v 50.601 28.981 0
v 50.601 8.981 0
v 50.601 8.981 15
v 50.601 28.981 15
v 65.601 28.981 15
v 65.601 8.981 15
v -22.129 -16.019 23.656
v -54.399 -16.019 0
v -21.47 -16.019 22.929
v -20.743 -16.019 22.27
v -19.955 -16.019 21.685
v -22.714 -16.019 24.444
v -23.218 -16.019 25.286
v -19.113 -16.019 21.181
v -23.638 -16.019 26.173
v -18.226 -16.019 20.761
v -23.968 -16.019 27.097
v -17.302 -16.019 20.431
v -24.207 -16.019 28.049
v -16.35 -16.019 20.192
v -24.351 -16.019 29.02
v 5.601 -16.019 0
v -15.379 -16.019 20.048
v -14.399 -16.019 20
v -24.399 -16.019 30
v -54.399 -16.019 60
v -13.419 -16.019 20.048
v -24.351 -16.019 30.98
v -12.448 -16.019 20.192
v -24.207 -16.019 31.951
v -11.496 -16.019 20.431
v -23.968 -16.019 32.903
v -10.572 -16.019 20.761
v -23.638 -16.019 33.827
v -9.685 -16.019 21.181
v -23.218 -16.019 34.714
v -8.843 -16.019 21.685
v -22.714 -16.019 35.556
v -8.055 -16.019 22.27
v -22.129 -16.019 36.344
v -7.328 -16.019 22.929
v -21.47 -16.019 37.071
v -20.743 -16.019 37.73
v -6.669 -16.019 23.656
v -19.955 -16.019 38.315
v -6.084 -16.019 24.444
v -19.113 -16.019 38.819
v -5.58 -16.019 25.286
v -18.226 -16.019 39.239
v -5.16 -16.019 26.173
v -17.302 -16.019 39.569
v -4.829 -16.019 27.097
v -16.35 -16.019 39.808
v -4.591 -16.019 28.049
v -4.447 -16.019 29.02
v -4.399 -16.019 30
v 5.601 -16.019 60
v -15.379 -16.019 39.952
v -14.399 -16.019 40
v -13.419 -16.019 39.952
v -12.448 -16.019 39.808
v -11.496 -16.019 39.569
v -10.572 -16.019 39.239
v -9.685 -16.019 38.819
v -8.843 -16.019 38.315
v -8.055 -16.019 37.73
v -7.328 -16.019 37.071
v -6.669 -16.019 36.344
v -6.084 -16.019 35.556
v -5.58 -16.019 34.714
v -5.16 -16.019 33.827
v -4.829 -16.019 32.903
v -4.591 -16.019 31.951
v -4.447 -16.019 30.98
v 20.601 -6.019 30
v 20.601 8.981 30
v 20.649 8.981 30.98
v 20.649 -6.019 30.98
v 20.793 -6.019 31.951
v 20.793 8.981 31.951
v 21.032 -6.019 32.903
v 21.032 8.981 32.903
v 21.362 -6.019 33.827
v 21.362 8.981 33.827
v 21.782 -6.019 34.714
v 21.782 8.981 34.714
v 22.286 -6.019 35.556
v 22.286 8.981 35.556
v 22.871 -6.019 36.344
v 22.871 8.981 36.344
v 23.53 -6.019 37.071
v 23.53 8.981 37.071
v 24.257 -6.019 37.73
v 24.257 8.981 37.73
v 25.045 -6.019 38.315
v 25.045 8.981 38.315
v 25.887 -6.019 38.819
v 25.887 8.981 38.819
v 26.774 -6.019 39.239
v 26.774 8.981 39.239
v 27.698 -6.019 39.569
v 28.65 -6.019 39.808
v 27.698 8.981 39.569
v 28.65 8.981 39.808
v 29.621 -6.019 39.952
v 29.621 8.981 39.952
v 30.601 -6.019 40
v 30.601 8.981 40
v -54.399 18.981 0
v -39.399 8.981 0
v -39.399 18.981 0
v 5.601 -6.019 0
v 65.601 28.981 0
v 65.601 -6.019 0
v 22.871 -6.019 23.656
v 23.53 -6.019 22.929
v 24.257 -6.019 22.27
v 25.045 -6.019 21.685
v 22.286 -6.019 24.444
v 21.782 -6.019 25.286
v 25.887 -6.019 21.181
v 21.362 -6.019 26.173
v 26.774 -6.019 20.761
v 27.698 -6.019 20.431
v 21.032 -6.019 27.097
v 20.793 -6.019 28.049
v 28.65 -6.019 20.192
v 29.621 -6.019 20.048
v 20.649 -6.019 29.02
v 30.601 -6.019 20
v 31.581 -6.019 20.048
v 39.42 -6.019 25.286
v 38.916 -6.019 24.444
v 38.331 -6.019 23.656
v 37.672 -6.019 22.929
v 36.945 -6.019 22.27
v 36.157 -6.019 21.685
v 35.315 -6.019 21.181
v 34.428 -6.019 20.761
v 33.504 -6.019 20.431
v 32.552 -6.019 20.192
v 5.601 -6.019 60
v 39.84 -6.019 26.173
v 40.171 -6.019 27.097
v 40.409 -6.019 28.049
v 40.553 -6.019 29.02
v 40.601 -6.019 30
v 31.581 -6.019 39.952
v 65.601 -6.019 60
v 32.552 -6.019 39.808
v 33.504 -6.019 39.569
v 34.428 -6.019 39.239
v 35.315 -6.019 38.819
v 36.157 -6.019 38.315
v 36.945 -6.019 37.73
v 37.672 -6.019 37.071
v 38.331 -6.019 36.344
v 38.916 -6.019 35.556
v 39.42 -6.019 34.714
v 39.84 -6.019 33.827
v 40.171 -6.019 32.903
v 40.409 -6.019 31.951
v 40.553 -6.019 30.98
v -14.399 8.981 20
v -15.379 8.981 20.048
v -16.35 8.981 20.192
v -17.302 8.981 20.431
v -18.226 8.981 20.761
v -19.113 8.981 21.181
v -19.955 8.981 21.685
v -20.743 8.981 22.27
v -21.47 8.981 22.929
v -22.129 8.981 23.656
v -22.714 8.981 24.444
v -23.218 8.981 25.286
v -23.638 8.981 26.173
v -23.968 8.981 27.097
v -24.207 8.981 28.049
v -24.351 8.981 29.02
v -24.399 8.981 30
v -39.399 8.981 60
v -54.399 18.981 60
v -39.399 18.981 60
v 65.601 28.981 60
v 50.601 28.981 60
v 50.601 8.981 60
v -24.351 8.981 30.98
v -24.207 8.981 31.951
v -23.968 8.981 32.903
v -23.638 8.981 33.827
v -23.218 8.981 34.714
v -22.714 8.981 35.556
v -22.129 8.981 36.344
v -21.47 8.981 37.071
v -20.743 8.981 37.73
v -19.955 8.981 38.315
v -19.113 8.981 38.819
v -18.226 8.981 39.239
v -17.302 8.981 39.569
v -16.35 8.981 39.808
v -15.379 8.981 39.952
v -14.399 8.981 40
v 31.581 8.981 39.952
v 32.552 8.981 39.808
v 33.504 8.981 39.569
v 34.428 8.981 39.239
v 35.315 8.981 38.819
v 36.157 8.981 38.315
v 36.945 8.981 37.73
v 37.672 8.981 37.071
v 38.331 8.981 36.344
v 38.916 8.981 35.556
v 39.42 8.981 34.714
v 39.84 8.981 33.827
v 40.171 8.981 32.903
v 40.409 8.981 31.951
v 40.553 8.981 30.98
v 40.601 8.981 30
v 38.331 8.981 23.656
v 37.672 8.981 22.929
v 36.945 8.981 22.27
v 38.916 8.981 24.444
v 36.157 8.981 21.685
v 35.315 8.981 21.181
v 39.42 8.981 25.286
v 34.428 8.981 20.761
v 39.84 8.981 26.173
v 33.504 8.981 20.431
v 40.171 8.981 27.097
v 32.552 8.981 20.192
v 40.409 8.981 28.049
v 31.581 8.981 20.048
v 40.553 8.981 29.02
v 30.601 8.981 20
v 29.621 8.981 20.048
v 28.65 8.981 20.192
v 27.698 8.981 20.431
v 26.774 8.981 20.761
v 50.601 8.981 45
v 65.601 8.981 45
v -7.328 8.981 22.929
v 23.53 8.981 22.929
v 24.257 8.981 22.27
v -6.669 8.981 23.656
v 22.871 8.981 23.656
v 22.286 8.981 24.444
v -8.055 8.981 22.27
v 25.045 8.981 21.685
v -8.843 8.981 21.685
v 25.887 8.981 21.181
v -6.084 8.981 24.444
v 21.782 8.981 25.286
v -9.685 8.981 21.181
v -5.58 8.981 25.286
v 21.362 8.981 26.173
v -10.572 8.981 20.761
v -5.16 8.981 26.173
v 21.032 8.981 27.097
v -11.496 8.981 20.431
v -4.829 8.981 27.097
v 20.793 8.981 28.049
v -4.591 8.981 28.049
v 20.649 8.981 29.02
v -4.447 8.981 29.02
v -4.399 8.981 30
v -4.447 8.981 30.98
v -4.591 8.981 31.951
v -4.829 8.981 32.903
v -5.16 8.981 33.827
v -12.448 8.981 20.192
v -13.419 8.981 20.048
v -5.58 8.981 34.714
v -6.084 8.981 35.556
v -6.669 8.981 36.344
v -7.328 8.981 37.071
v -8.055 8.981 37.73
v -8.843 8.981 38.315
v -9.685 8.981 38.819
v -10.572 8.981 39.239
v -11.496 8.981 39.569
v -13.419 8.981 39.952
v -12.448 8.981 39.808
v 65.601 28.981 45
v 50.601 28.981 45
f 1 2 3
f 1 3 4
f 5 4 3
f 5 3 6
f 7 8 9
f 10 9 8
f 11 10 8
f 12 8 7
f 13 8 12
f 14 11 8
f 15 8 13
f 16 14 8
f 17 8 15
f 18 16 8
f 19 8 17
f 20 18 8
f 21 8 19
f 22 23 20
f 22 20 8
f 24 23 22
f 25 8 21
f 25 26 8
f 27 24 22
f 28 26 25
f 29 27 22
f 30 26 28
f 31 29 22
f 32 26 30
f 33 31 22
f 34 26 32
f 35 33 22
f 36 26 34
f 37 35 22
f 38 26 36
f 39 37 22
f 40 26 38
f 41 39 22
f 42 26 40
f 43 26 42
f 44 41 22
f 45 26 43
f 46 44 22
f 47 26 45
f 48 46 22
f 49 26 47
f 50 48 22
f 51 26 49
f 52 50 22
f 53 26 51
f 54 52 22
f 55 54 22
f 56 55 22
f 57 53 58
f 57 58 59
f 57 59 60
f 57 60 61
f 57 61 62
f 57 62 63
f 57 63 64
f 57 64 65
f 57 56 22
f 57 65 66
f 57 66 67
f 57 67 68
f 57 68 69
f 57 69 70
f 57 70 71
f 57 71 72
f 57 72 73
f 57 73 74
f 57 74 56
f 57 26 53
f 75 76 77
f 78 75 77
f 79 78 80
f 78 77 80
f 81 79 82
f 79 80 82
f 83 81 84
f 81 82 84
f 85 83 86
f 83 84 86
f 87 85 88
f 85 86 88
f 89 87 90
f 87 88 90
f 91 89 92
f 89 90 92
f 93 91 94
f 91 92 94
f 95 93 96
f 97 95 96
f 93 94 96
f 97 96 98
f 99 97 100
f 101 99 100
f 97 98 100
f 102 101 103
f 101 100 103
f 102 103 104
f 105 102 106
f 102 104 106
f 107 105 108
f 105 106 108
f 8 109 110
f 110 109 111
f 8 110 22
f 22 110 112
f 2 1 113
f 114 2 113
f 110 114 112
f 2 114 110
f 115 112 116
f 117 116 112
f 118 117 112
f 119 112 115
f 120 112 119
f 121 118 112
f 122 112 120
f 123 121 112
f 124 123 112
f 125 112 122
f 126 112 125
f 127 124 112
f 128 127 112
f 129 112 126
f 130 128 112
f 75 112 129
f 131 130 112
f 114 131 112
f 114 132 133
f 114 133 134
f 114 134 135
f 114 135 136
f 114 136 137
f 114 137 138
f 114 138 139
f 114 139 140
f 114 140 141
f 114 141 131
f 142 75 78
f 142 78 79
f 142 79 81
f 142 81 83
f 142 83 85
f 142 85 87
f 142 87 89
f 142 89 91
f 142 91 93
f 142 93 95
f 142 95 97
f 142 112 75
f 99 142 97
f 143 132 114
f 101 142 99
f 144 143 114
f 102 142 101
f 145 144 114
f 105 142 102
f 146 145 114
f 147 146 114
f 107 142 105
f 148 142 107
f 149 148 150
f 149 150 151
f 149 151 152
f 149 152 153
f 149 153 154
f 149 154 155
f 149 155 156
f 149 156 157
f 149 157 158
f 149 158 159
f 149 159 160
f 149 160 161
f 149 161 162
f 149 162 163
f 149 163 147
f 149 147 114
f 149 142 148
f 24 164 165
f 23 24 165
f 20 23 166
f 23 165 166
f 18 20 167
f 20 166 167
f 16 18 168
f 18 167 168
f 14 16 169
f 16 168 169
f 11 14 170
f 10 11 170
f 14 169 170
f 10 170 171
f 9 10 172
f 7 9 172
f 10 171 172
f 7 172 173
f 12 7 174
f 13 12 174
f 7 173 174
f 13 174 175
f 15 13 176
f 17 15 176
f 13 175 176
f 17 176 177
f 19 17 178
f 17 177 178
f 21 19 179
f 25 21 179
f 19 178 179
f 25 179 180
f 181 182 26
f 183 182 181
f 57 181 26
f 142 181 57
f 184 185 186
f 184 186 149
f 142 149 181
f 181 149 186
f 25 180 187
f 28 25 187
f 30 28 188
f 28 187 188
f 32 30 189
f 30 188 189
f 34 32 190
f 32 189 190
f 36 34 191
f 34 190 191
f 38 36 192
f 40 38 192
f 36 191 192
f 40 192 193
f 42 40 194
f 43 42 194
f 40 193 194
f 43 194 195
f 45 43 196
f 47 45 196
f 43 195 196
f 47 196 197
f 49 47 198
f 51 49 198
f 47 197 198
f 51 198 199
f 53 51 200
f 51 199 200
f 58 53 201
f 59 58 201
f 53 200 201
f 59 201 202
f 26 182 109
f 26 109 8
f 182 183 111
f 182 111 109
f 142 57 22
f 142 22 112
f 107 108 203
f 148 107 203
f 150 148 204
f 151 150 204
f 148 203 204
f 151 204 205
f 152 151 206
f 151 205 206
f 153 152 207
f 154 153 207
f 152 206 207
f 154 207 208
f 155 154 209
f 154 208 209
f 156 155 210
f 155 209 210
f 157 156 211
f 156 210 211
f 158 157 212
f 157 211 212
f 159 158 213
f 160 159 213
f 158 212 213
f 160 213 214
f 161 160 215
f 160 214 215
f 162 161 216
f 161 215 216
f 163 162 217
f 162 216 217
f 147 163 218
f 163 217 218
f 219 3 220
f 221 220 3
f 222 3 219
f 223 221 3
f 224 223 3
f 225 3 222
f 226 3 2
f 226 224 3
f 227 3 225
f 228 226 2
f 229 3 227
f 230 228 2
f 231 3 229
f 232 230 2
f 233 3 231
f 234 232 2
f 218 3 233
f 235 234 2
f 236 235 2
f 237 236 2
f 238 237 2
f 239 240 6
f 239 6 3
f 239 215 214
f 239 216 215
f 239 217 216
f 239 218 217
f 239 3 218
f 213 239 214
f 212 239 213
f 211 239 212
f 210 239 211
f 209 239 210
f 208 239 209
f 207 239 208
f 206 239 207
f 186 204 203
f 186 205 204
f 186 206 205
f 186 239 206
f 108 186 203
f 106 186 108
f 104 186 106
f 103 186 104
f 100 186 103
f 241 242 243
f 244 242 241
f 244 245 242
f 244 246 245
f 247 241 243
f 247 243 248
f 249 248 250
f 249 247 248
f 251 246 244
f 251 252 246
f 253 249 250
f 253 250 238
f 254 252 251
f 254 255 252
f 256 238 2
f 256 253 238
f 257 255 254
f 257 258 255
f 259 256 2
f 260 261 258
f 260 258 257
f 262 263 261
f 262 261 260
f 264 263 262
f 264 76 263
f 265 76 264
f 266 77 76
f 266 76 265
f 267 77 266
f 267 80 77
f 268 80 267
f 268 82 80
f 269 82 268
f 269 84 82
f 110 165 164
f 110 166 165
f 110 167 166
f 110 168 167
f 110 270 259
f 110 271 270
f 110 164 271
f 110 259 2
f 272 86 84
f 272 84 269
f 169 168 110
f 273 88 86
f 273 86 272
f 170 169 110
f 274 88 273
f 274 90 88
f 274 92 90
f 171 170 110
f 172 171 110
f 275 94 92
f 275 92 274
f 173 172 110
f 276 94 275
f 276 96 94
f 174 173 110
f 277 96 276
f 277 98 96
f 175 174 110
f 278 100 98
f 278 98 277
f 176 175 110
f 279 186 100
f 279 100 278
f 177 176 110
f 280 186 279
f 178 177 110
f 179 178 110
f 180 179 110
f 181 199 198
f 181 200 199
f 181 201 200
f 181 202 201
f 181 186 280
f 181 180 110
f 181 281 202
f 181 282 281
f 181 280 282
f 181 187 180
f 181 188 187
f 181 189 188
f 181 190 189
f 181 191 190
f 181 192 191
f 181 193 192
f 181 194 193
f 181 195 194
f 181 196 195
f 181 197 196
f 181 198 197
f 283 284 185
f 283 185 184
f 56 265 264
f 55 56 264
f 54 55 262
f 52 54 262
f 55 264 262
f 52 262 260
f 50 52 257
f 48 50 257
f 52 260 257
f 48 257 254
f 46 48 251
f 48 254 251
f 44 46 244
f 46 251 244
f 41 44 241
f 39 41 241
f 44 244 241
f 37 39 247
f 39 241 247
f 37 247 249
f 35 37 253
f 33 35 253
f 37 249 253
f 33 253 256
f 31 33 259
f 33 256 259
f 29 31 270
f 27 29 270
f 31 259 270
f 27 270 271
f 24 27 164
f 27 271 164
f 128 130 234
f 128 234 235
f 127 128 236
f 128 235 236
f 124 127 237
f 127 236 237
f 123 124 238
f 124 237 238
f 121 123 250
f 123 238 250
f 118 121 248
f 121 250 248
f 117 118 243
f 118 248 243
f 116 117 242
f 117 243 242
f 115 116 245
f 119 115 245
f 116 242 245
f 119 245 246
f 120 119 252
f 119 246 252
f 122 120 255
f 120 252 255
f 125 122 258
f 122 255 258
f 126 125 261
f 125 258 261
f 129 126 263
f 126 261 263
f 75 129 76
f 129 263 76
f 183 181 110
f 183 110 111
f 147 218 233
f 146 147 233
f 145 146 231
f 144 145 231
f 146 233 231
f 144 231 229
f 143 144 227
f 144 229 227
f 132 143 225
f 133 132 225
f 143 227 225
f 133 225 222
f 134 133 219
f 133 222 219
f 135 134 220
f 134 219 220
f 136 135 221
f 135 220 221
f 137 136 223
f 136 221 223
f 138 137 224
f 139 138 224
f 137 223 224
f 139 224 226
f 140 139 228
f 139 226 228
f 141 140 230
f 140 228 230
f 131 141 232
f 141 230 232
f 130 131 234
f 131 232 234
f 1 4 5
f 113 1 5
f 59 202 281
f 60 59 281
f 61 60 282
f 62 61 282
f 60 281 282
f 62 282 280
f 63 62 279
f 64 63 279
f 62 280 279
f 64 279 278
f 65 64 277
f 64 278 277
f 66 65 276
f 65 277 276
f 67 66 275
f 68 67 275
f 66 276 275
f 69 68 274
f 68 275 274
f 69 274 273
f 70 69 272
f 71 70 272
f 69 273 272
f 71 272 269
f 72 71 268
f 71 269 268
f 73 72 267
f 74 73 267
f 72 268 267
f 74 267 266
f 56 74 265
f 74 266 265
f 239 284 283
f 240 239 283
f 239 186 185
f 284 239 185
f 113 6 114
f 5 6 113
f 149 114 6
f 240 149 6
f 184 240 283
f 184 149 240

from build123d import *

# Parameters (mm, degrees)
F1_DEPTH = 30
F0_W     = 15
F0_H     = 20
F2_DEPTH = 15
F5_DEPTH = 25.001


with BuildPart() as f1:
    # F0 (on Top) → F1 (new body)
    with BuildSketch(Plane.XY):
        Polygon((-39.3988706533, 18.9813024559), (-54.3988706533, 18.9813024559), (-54.3988706533, -16.0186975441), (5.6011293467, -16.0186975441), (5.6011293467, -6.0186975441), (65.6011293467, -6.0186975441), (65.6011293467, 8.9813024559), (50.6011293467, 8.9813024559), (-39.3988706533, 8.9813024559), align=None)
    extrude(amount=F1_DEPTH)

    # F0 (on Top) → F2 (join)
    with BuildSketch(Plane.XY):
        Polygon((-39.3988706533, 18.9813024559), (-54.3988706533, 18.9813024559), (-54.3988706533, -16.0186975441), (5.6011293467, -16.0186975441), (5.6011293467, -6.0186975441), (65.6011293467, -6.0186975441), (65.6011293467, 8.9813024559), (50.6011293467, 8.9813024559), (-39.3988706533, 8.9813024559), align=None)
        with Locations((58.1011293467, 18.9813024559)):
            Rectangle(F0_W, F0_H)
    extrude(amount=F2_DEPTH)

    # F3: F1 across face


with BuildPart() as f1_1:
    add(f1.part)
    add(f1.part.mirror(Plane(origin=(-4.5459294768, -0.7245798971, 30), x_dir=(1, 0, 0), z_dir=(0, 0, 1))))

    # F4 (on face) → F5 (cut, through all)
    with BuildSketch(Plane(origin=(0, 8.9813024559, 0), x_dir=(-1, 0, 0), z_dir=(0, 1, 0))):
        with BuildLine():
            Line((-30.6011293467, 20), (-30.6011293467, 30))
            Line((-30.6011293467, 30), (-40.6011293467, 30))
            ThreePointArc((-40.6011293467, 30), (-37.6721971586, 22.9289321881), (-30.6011293467, 20))
        make_face()
        with BuildLine():
            Line((-20.6011293467, 30), (-30.6011293467, 30))
            Line((-30.6011293467, 30), (-30.6011293467, 20))
            ThreePointArc((-30.6011293467, 20), (-23.5300615349, 22.9289321881), (-20.6011293467, 30))
        make_face()
        with BuildLine():
            ThreePointArc((-20.6011293467, 30), (-23.5300615349, 37.0710678119), (-30.6011293467, 40))
            Line((-30.6011293467, 40), (-30.6011293467, 30))
            Line((-30.6011293467, 30), (-20.6011293467, 30))
        make_face()
        with BuildLine():
            Line((-30.6011293467, 30), (-30.6011293467, 40))
            ThreePointArc((-30.6011293467, 40), (-37.6721971586, 37.0710678119), (-40.6011293467, 30))
            Line((-40.6011293467, 30), (-30.6011293467, 30))
        make_face()
        with BuildLine():
            Line((24.3988706533, 30), (14.3988706533, 30))
            Line((14.3988706533, 30), (14.3988706533, 20))
            ThreePointArc((14.3988706533, 20), (21.4699384651, 22.9289321881), (24.3988706533, 30))
        make_face()
        with BuildLine():
            Line((14.3988706533, 30), (4.3988706533, 30))
            ThreePointArc((4.3988706533, 30), (7.3278028414, 22.9289321881), (14.3988706533, 20))
            Line((14.3988706533, 20), (14.3988706533, 30))
        make_face()
        with BuildLine():
            Line((14.3988706533, 30), (14.3988706533, 40))
            ThreePointArc((14.3988706533, 40), (7.3278028414, 37.0710678119), (4.3988706533, 30))
            Line((4.3988706533, 30), (14.3988706533, 30))
        make_face()
        with BuildLine():
            ThreePointArc((24.3988706533, 30), (21.4699384651, 37.0710678119), (14.3988706533, 40))
            Line((14.3988706533, 40), (14.3988706533, 30))
            Line((14.3988706533, 30), (24.3988706533, 30))
        make_face()
    extrude(amount=-F5_DEPTH, mode=Mode.SUBTRACT)


solid = f1_1.part
